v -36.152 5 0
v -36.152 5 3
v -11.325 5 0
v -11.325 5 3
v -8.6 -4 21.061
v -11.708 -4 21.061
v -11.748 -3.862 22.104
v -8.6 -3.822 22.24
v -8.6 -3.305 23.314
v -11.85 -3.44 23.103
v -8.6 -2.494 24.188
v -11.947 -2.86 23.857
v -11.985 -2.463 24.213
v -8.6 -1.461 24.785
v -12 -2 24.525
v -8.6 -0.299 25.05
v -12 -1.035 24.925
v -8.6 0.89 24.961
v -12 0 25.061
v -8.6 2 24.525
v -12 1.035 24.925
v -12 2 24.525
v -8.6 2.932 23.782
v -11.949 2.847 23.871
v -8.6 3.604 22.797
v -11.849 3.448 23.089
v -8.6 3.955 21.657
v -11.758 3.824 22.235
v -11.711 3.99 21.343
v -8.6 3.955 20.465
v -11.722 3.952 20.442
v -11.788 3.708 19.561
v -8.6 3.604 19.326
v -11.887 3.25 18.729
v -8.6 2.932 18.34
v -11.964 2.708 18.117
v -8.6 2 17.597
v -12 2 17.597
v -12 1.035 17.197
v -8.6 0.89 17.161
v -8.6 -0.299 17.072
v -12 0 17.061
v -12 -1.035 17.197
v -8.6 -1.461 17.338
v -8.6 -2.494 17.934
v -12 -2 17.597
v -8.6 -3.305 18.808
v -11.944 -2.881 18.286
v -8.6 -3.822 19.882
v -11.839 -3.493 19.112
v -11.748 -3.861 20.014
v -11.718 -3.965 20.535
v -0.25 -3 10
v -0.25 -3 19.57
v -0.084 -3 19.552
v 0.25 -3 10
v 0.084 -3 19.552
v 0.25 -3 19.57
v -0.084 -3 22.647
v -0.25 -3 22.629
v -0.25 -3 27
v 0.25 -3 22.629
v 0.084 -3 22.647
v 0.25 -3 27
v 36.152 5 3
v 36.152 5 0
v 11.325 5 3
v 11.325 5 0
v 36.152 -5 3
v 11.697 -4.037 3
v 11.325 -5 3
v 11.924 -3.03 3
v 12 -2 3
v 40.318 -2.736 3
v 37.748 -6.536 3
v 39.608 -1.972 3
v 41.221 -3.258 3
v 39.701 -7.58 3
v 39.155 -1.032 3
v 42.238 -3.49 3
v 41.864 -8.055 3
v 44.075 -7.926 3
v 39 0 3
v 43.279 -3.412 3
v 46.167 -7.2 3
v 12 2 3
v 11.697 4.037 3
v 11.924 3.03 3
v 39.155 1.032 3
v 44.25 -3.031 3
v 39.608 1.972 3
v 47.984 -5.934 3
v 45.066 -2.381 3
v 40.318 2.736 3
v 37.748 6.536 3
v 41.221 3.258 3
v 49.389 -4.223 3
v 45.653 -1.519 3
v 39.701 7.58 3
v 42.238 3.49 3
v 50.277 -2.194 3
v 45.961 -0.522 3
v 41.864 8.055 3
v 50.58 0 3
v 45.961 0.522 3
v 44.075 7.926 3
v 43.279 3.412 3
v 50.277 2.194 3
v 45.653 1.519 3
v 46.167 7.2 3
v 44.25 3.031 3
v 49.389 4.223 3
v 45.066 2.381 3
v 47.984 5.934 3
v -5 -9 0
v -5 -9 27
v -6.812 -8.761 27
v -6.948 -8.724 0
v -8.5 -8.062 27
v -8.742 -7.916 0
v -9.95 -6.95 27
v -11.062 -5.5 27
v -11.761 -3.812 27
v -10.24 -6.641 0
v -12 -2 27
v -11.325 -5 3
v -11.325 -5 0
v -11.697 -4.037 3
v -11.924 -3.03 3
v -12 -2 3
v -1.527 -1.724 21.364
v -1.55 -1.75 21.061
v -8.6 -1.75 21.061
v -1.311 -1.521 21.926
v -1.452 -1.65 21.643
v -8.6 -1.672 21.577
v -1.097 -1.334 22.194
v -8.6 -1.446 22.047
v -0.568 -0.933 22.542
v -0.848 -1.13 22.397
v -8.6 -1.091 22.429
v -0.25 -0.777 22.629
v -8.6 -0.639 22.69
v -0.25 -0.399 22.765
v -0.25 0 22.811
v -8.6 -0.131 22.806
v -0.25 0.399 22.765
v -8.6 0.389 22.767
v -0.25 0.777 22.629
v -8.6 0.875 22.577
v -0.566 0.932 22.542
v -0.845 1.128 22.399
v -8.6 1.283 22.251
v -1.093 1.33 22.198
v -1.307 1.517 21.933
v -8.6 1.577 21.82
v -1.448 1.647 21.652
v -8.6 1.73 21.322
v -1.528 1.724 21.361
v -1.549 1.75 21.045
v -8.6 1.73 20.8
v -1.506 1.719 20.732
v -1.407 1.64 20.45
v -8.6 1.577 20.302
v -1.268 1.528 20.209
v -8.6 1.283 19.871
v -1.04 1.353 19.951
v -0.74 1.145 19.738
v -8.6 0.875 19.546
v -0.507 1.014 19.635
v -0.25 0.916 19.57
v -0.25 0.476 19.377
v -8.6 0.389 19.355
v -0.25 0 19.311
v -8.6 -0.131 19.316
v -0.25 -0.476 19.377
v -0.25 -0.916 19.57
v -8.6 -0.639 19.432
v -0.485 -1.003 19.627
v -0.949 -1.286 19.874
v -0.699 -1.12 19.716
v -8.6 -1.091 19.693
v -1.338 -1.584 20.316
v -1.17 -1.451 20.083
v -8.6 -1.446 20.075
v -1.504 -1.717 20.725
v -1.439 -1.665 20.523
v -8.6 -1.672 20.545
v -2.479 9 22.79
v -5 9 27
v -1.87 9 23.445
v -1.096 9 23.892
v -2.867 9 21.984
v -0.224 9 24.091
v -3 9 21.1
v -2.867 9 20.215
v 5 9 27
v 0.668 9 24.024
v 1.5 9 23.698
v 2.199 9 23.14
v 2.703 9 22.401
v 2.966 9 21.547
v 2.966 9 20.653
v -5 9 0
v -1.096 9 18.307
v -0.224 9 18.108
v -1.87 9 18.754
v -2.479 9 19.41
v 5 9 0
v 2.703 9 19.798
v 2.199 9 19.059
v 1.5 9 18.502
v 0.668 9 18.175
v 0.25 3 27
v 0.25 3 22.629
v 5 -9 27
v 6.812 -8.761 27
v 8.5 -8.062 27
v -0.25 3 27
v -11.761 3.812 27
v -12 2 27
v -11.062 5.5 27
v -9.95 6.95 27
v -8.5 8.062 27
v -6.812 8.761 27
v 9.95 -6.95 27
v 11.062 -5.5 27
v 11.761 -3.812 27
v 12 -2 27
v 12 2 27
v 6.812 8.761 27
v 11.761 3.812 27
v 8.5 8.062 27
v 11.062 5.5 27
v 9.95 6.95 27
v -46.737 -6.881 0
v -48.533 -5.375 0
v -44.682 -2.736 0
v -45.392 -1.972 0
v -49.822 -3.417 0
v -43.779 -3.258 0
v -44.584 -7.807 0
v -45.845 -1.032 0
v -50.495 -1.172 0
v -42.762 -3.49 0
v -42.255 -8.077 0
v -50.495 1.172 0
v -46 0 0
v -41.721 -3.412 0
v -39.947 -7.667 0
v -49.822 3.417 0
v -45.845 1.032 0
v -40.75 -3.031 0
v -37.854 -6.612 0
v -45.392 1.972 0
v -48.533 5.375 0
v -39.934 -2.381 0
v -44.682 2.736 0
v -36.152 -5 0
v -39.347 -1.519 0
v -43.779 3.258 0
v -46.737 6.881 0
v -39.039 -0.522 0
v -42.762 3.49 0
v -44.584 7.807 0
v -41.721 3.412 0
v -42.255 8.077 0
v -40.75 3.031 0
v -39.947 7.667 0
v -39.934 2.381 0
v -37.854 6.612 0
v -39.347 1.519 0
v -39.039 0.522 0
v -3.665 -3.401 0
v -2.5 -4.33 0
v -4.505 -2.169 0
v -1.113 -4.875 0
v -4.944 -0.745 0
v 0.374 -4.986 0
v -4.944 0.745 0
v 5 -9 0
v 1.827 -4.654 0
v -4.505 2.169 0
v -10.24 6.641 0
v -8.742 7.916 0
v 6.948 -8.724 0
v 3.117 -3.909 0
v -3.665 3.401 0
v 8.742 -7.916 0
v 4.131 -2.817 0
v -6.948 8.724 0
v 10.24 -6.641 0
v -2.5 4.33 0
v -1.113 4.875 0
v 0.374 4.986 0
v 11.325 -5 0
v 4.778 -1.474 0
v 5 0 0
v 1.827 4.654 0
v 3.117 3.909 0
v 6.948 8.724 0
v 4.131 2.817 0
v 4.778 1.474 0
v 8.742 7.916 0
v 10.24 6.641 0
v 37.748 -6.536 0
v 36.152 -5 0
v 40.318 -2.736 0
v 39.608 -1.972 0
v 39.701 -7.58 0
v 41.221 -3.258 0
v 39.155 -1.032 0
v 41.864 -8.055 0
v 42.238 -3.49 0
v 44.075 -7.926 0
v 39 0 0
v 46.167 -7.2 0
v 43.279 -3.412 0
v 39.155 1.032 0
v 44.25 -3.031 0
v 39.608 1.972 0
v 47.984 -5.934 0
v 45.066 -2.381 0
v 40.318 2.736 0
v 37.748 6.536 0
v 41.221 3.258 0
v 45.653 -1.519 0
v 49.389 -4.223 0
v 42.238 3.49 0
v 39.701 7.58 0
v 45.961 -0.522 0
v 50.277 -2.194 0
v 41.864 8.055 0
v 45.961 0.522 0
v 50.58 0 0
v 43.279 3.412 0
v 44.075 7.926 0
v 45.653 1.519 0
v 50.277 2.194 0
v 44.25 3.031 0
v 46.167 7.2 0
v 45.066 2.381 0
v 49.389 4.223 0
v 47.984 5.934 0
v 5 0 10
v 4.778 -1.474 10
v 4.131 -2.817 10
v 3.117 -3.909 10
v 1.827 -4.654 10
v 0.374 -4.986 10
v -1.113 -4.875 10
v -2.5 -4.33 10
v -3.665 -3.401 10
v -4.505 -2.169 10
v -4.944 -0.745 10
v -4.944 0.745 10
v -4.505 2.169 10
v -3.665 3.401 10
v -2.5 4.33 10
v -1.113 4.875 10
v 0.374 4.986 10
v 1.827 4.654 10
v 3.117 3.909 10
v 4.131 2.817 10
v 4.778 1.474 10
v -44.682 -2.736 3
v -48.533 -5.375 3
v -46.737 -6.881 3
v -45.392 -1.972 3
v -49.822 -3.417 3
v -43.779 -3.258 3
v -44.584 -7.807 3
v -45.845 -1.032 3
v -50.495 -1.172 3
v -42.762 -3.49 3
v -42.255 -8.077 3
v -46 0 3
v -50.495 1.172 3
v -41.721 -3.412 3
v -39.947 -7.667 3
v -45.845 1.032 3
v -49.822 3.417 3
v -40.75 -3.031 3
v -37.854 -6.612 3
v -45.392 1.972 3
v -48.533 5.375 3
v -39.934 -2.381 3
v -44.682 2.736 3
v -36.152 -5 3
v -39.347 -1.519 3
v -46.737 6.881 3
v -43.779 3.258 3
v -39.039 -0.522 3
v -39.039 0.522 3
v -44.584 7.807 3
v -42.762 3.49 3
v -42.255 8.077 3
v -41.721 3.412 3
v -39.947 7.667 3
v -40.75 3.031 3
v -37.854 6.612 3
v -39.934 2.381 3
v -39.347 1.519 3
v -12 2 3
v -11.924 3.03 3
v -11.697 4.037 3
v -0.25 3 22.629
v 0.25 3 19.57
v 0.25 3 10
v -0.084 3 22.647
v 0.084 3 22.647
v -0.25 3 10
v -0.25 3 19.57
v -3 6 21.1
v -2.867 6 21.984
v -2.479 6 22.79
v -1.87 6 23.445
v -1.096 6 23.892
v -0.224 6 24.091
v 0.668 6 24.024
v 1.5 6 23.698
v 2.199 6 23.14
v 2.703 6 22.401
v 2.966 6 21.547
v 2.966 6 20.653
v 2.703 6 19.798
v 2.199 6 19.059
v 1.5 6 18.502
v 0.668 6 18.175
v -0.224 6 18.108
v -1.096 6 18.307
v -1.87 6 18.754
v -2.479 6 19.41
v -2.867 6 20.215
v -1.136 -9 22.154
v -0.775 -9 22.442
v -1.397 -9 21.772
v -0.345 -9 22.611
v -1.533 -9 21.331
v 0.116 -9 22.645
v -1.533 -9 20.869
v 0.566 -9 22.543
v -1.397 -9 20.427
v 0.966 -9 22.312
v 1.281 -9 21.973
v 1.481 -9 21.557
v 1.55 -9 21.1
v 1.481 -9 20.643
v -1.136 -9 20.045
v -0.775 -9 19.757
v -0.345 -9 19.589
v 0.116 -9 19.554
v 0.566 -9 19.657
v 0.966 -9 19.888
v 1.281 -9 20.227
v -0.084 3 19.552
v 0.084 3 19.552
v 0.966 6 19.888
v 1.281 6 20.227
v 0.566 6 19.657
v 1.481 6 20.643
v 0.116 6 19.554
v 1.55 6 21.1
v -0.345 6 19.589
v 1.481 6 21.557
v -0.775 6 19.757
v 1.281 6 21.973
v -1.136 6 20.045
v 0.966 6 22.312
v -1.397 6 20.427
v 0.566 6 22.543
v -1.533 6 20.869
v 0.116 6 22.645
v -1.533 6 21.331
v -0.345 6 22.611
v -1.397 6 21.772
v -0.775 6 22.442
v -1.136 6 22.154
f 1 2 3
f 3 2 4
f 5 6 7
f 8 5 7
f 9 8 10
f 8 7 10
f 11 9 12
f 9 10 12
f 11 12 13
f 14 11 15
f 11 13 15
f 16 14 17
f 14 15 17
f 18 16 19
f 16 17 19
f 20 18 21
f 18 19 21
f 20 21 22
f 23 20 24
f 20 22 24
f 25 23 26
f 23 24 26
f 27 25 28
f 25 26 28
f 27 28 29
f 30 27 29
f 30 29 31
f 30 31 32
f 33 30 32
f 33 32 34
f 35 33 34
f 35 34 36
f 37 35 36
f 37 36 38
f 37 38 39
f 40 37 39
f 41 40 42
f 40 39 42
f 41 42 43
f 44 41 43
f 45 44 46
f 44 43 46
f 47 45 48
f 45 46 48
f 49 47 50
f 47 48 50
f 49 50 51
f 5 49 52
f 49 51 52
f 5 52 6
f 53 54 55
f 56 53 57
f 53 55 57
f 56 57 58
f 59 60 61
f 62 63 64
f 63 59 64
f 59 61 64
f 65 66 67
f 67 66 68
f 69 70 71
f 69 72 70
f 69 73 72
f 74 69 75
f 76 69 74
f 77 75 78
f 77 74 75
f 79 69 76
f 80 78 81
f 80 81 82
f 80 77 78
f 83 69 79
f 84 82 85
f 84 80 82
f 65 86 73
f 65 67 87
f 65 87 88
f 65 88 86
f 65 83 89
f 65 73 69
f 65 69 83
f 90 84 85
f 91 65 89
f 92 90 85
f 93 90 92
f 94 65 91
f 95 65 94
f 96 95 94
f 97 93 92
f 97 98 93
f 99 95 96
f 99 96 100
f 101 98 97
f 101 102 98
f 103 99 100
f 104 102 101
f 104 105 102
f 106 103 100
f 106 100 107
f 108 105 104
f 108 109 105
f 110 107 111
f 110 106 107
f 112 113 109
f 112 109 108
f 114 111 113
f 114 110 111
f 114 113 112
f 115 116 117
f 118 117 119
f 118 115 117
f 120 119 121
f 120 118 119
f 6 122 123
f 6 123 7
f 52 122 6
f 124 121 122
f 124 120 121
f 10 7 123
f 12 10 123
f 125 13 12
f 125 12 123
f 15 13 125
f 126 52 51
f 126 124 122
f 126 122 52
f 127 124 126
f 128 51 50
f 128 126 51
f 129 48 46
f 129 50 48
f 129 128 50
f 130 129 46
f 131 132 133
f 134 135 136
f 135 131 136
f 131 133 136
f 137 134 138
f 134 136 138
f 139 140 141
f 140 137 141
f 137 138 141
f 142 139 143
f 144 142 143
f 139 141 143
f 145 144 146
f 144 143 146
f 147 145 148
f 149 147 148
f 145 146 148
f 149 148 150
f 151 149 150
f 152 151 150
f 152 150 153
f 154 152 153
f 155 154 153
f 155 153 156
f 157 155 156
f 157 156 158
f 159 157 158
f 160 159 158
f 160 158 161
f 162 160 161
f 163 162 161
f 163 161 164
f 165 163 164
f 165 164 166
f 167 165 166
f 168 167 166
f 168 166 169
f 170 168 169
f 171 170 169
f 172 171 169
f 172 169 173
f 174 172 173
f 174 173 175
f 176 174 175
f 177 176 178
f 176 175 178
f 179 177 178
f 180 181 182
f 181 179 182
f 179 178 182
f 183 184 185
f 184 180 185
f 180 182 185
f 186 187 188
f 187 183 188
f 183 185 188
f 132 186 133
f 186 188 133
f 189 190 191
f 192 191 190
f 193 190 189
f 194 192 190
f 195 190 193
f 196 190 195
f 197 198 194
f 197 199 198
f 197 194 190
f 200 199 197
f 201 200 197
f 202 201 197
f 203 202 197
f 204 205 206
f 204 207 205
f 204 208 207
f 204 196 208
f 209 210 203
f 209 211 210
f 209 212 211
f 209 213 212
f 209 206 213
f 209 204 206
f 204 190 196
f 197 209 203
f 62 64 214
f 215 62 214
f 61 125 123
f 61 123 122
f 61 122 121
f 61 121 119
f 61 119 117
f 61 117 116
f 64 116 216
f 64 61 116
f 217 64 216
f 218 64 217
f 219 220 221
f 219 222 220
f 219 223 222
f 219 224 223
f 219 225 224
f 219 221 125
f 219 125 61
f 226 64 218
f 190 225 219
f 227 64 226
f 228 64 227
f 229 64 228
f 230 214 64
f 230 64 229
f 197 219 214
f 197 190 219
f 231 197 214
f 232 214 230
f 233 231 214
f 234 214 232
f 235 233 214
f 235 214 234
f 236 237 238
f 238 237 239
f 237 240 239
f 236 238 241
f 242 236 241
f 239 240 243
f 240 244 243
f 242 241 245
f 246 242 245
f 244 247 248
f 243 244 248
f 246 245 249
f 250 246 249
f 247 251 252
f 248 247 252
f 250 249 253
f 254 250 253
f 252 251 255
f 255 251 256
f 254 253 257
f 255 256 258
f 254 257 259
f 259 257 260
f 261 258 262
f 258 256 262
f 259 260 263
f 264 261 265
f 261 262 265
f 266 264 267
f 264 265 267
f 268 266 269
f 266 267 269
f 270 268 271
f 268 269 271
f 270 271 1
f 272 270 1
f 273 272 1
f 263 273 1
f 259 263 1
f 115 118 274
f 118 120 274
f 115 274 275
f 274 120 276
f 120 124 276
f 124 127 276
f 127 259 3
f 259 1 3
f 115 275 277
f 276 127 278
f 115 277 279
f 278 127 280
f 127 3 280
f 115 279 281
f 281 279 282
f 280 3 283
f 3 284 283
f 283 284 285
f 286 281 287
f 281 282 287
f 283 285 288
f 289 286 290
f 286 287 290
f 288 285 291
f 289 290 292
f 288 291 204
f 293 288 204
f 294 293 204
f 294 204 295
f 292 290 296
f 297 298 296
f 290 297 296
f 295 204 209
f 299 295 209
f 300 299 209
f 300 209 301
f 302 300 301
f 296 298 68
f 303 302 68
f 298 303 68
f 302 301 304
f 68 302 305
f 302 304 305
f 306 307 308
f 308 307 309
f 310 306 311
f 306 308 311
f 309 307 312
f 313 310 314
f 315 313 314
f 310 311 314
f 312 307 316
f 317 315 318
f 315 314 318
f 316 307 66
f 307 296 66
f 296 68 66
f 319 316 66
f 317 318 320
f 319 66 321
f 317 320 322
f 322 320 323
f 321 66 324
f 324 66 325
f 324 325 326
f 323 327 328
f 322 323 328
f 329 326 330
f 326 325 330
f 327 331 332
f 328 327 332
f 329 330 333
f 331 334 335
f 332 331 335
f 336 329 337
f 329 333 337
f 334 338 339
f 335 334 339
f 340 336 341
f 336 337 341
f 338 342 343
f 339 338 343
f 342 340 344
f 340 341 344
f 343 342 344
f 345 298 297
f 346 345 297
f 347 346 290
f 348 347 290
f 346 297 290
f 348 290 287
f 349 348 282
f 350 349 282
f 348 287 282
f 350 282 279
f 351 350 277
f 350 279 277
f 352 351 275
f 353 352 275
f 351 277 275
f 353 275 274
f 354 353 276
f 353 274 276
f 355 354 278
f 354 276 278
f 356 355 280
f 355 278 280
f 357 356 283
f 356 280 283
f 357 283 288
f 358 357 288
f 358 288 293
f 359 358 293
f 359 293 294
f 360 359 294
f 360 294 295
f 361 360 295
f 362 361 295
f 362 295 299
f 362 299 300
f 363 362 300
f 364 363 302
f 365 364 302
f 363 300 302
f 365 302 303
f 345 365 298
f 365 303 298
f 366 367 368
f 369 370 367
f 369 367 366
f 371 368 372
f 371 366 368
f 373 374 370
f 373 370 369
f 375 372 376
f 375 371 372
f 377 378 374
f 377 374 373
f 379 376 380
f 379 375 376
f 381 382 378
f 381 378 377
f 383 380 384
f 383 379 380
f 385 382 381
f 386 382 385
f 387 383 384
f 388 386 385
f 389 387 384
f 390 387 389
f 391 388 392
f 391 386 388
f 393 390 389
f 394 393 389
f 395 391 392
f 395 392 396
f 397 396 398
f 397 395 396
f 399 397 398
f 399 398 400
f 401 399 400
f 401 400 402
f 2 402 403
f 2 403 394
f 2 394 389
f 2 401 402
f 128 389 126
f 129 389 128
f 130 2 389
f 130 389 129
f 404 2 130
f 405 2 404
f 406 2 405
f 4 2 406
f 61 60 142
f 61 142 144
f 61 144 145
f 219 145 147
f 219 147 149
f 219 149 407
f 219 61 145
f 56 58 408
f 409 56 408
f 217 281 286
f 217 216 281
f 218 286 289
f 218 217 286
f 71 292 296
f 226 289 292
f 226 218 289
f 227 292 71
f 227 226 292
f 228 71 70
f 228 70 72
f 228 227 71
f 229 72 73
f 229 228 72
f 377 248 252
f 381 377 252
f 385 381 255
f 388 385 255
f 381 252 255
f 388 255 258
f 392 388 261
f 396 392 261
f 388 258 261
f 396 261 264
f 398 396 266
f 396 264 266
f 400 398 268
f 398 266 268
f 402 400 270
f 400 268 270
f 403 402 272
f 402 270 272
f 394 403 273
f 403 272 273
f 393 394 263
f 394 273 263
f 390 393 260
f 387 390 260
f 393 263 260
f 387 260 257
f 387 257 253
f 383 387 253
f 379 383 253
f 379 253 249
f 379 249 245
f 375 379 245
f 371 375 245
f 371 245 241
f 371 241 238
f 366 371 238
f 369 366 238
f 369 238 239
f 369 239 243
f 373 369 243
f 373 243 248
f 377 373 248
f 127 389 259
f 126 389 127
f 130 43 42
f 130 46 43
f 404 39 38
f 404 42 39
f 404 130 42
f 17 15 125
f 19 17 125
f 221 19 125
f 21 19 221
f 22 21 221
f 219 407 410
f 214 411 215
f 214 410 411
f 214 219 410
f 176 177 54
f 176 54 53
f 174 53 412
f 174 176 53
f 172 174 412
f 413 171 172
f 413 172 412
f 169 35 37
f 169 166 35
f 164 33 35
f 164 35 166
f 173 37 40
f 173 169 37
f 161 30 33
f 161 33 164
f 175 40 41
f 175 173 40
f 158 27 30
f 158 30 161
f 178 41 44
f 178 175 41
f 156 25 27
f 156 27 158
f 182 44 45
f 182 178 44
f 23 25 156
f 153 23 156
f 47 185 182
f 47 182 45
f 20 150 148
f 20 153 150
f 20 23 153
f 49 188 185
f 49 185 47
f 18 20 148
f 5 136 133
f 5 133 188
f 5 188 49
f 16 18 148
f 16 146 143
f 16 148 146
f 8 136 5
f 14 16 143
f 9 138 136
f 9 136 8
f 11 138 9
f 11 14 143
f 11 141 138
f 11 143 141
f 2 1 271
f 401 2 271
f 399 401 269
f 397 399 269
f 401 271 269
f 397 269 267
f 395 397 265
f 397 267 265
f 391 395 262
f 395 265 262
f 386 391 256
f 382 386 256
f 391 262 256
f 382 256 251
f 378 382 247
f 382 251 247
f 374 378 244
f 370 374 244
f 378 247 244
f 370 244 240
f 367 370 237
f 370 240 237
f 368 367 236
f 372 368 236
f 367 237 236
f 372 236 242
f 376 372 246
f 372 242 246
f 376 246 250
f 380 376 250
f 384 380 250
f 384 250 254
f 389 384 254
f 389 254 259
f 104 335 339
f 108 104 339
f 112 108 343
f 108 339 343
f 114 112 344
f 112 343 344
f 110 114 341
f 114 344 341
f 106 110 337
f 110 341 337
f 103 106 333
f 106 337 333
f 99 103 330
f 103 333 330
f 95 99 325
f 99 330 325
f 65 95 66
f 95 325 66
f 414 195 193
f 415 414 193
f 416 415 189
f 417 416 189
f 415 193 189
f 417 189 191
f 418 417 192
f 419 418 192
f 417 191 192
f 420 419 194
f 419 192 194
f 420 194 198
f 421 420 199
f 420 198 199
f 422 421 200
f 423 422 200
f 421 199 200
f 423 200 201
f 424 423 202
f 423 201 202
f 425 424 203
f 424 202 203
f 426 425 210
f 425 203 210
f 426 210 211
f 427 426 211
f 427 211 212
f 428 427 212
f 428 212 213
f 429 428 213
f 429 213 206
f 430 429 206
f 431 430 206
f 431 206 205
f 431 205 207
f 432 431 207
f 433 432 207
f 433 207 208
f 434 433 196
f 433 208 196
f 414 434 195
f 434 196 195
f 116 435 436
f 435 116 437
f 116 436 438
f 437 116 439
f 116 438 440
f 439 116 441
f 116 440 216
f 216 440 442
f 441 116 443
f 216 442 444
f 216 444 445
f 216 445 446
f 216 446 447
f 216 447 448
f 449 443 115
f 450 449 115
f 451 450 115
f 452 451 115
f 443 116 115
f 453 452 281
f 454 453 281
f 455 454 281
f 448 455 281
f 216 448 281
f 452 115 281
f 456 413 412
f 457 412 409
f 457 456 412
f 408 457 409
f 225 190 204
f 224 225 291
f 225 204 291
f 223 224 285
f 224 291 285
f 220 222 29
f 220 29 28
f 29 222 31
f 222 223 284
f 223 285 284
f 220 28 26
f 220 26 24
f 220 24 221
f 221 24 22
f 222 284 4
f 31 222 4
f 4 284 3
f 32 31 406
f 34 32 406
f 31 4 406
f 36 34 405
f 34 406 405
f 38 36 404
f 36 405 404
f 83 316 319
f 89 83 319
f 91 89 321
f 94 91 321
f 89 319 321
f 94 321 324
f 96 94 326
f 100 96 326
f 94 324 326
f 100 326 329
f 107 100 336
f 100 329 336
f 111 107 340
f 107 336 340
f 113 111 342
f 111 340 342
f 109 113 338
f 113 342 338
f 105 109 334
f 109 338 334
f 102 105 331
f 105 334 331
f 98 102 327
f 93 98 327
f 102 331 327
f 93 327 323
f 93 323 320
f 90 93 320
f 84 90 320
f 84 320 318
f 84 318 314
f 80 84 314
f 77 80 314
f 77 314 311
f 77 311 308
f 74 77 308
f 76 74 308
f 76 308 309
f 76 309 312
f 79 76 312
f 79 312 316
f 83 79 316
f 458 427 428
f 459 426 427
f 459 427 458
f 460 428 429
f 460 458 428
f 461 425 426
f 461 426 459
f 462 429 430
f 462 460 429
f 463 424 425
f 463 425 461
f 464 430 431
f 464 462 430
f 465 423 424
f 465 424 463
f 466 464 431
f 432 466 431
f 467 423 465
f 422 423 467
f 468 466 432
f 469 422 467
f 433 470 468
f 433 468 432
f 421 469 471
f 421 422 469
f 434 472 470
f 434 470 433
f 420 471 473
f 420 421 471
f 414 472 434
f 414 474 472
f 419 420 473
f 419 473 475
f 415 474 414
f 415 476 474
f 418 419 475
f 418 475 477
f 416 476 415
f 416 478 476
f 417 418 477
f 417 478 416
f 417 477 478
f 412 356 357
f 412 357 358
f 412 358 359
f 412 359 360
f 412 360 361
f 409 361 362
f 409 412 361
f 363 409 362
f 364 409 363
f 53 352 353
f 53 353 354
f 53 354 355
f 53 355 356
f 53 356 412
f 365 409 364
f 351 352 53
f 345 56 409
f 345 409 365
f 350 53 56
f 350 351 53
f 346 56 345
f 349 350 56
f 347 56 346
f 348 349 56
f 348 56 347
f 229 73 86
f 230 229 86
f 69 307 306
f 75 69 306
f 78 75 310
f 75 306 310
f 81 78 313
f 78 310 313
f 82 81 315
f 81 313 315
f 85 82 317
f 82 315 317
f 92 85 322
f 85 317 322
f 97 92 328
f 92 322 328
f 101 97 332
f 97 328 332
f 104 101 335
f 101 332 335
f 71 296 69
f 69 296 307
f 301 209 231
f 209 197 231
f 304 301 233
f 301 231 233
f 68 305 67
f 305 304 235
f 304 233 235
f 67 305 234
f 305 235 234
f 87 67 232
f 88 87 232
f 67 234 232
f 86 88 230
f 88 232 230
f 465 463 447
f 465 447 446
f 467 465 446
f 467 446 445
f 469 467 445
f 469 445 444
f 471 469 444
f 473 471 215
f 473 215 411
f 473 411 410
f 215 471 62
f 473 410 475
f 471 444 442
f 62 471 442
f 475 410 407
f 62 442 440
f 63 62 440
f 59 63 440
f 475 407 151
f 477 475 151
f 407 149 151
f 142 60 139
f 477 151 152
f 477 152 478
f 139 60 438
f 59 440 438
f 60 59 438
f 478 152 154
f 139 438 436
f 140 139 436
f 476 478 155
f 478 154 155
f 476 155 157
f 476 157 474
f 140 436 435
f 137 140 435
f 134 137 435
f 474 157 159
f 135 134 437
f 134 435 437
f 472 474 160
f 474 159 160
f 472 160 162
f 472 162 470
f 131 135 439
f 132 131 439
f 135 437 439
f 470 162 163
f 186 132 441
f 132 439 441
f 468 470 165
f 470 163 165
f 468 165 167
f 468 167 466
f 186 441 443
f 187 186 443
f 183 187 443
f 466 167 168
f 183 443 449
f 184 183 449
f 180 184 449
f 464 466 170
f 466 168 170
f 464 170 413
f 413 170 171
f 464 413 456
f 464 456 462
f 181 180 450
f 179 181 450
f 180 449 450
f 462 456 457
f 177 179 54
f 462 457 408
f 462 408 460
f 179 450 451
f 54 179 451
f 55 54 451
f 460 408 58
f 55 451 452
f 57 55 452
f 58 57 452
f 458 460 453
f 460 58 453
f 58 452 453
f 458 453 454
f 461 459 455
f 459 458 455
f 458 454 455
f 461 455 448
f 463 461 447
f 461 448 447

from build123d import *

# Parameters (mm, degrees)
F1_DEPTH     = 3
F3_D         = 7
F4_W         = 24
F4_H         = 18
F5_DEPTH     = 27
F6_R         = 1.55
F7_DEPTH     = 12.5
F8_R         = 1.75
F9_DEPTH     = 12
F10_R        = 4
F11_DEPTH    = 3.4
F12_T4_DEPTH = 62
F12_T9_DEPTH = 62
F13_R        = 7
F14_T4_DEPTH = 62
F14_T9_DEPTH = 62
F15_R        = 7
F16_W        = 0.5
F16_H        = 6
F17_DEPTH    = 20
F18_R        = 5
F19_DEPTH    = 10
F20_R        = 3
F20_R_2      = 1.55
F21_DEPTH    = 3


# Not quite as in the source:
# - a fillet or chamfer that OpenCascade refuses, or shapes differently, is made with other operations: its cross-section is extruded or revolved along the edge and cut away or added


with BuildPart() as f1:
    # F0 (on Top) → F1 (new body)
    with BuildSketch(Plane.XY):
        with BuildLine():
            Line((42.5, 5), (42.5, -5))
            Line((42.5, -5), (36.1522351233, -5))
            ThreePointArc((36.1522351233, -5), (45.1458596679, -7.635020992), (50.5804776424, 0))
            ThreePointArc((50.5804776424, 0), (45.1458596679, 7.635020992), (36.1522351233, 5))
            Line((36.1522351233, 5), (42.5, 5))
        make_face()
        with BuildLine():
            ThreePointArc((-36.1522351233, 5), (-50.5804776424, 0), (-36.1522351233, -5))
            Line((-36.1522351233, -5), (-42.5, -5))
            Line((-42.5, -5), (-42.5, 5))
            Line((-42.5, 5), (-36.1522351233, 5))
        make_face()
        with BuildLine():
            Line((36.1522351233, -5), (42.5, -5))
            Line((42.5, -5), (42.5, 5))
            Line((42.5, 5), (36.1522351233, 5))
            ThreePointArc((36.1522351233, 5), (34.4195223576, 0), (36.1522351233, -5))
        make_face()
        with BuildLine():
            Line((-36.1522351233, -5), (36.1522351233, -5))
            ThreePointArc((36.1522351233, -5), (34.4195223576, 0), (36.1522351233, 5))
            Line((36.1522351233, 5), (-36.1522351233, 5))
            ThreePointArc((-36.1522351233, 5), (-34.864979008, 2.6458596679), (-34.4195223576, 0))
            ThreePointArc((-34.4195223576, 0), (-34.864979008, -2.6458596679), (-36.1522351233, -5))
        make_face()
        with BuildLine():
            Line((-42.5, -5), (-36.1522351233, -5))
            ThreePointArc((-36.1522351233, -5), (-34.864979008, -2.6458596679), (-34.4195223576, 0))
            ThreePointArc((-34.4195223576, 0), (-34.864979008, 2.6458596679), (-36.1522351233, 5))
            Line((-36.1522351233, 5), (-42.5, 5))
            Line((-42.5, 5), (-42.5, -5))
        make_face()
    extrude(amount=F1_DEPTH)

    # F3 (through all)
    with Locations(Plane.XY.offset(3)):
        with Locations((-42.5, 0), (42.5, 0)):
            Hole(F3_D / 2)

    # F4 (on Top) → F5 (join)
    with BuildSketch(Plane.XY):
        Rectangle(F4_W, F4_H)
    extrude(amount=F5_DEPTH)

    # F6 (on Front) → F7 (cut, symmetric)
    with BuildSketch(Plane.XZ):
        with Locations((0, 21.0996698588)):
            Circle(F6_R)
    extrude(amount=F7_DEPTH, both=True, mode=Mode.SUBTRACT)

    # F8 (on face) → F9 (cut)
    with BuildSketch(Plane(origin=(-12, 0, 0), x_dir=(0, -1, 0), z_dir=(-1, 0, 0))):
        with Locations((0, 21.061129868)):
            Circle(F8_R)
    extrude(amount=-F9_DEPTH, mode=Mode.SUBTRACT)

    # F10 (on face) → F11 (cut)
    with BuildSketch(Plane(origin=(-12, 0, 0), x_dir=(0, -1, 0), z_dir=(-1, 0, 0))):
        with Locations((0, 21.061129868)):
            Circle(F10_R)
    extrude(amount=-F11_DEPTH, mode=Mode.SUBTRACT)

    # F12: fillet of radius 7 on 1 edges, made by hand


with BuildPart() as f12_tool2:
    # F12_s3 → F12_t4 (new body)
    with BuildSketch(Plane.XY.offset(-17.5)):
        with BuildLine():
            ThreePointArc((-5, 9), (-9.9497474683, 6.9497474683), (-12, 2))
            Line((-12, 2), (-12, 9))
            Line((-12, 9), (-5, 9))
        make_face()
    extrude(amount=F12_T4_DEPTH)

    split(bisect_by=Plane.XZ.offset(-5), keep=Keep.BOTTOM)


with BuildPart() as f1_1:
    add(f1.part)

    # F12_t1: cut F12_tool2
    add(f12_tool2.part, mode=Mode.SUBTRACT)


with BuildPart() as f12_tool7:
    # F12_s8 → F12_t9 (new body)
    with BuildSketch(Plane.XY.offset(-17.5)):
        with BuildLine():
            ThreePointArc((-5, 9), (-9.9497474683, 6.9497474683), (-12, 2))
            Line((-12, 2), (-12, 9))
            Line((-12, 9), (-5, 9))
        make_face()
    extrude(amount=F12_T9_DEPTH)

    split(bisect_by=Plane.XY.offset(3), keep=Keep.TOP)


with BuildPart() as f1_2:
    add(f1_1.part)

    # F12_t6: cut F12_tool7
    add(f12_tool7.part, mode=Mode.SUBTRACT)

    # F13
    f13_edges = [f1_2.edges().sort_by_distance(p)[0] for p in [
        (12, 9, 13.5),
    ]]
    fillet(f13_edges, radius=F13_R)

    # F14: fillet of radius 7 on 1 edges, made by hand


with BuildPart() as f14_tool2:
    # F14_s3 → F14_t4 (new body)
    with BuildSketch(Plane.XY.offset(-17.5)):
        with BuildLine():
            ThreePointArc((-5, -9), (-9.9497474683, -6.9497474683), (-12, -2))
            Line((-12, -2), (-12, -9))
            Line((-12, -9), (-5, -9))
        make_face()
    extrude(amount=F14_T4_DEPTH)

    split(bisect_by=Plane.XZ.offset(5), keep=Keep.TOP)


with BuildPart() as f1_3:
    add(f1_2.part)

    # F14_t1: cut F14_tool2
    add(f14_tool2.part, mode=Mode.SUBTRACT)


with BuildPart() as f14_tool7:
    # F14_s8 → F14_t9 (new body)
    with BuildSketch(Plane.XY.offset(-17.5)):
        with BuildLine():
            ThreePointArc((-5, -9), (-9.9497474683, -6.9497474683), (-12, -2))
            Line((-12, -2), (-12, -9))
            Line((-12, -9), (-5, -9))
        make_face()
    extrude(amount=F14_T9_DEPTH)

    split(bisect_by=Plane.XY.offset(3), keep=Keep.TOP)


with BuildPart() as f1_4:
    add(f1_3.part)

    # F14_t6: cut F14_tool7
    add(f14_tool7.part, mode=Mode.SUBTRACT)

    # F15
    f15_edges = [f1_4.edges().sort_by_distance(p)[0] for p in [
        (12, -9, 13.5),
    ]]
    fillet(f15_edges, radius=F15_R)

    # F16 (on face) → F17 (cut)
    with BuildSketch(Plane.XY.offset(27)):
        Rectangle(F16_W, F16_H)
    extrude(amount=-F17_DEPTH, mode=Mode.SUBTRACT)

    # F18 (on face) → F19 (cut)
    with BuildSketch(Plane(origin=(0, 0, 0), x_dir=(1, 0, 0), z_dir=(0, 0, -1))):
        Circle(F18_R)
    extrude(amount=-F19_DEPTH, mode=Mode.SUBTRACT)

    # F20 (on face) → F21 (cut)
    with BuildSketch(Plane(origin=(0, 9, 0), x_dir=(-1, 0, 0), z_dir=(0, 1, 0))):
        with Locations((0, 21.0996698588)):
            Circle(F20_R)
        with Locations((0, 21.0996698588)):
            Circle(F20_R_2, mode=Mode.SUBTRACT)
    extrude(amount=-F21_DEPTH, mode=Mode.SUBTRACT)


solid = f1_4.part
